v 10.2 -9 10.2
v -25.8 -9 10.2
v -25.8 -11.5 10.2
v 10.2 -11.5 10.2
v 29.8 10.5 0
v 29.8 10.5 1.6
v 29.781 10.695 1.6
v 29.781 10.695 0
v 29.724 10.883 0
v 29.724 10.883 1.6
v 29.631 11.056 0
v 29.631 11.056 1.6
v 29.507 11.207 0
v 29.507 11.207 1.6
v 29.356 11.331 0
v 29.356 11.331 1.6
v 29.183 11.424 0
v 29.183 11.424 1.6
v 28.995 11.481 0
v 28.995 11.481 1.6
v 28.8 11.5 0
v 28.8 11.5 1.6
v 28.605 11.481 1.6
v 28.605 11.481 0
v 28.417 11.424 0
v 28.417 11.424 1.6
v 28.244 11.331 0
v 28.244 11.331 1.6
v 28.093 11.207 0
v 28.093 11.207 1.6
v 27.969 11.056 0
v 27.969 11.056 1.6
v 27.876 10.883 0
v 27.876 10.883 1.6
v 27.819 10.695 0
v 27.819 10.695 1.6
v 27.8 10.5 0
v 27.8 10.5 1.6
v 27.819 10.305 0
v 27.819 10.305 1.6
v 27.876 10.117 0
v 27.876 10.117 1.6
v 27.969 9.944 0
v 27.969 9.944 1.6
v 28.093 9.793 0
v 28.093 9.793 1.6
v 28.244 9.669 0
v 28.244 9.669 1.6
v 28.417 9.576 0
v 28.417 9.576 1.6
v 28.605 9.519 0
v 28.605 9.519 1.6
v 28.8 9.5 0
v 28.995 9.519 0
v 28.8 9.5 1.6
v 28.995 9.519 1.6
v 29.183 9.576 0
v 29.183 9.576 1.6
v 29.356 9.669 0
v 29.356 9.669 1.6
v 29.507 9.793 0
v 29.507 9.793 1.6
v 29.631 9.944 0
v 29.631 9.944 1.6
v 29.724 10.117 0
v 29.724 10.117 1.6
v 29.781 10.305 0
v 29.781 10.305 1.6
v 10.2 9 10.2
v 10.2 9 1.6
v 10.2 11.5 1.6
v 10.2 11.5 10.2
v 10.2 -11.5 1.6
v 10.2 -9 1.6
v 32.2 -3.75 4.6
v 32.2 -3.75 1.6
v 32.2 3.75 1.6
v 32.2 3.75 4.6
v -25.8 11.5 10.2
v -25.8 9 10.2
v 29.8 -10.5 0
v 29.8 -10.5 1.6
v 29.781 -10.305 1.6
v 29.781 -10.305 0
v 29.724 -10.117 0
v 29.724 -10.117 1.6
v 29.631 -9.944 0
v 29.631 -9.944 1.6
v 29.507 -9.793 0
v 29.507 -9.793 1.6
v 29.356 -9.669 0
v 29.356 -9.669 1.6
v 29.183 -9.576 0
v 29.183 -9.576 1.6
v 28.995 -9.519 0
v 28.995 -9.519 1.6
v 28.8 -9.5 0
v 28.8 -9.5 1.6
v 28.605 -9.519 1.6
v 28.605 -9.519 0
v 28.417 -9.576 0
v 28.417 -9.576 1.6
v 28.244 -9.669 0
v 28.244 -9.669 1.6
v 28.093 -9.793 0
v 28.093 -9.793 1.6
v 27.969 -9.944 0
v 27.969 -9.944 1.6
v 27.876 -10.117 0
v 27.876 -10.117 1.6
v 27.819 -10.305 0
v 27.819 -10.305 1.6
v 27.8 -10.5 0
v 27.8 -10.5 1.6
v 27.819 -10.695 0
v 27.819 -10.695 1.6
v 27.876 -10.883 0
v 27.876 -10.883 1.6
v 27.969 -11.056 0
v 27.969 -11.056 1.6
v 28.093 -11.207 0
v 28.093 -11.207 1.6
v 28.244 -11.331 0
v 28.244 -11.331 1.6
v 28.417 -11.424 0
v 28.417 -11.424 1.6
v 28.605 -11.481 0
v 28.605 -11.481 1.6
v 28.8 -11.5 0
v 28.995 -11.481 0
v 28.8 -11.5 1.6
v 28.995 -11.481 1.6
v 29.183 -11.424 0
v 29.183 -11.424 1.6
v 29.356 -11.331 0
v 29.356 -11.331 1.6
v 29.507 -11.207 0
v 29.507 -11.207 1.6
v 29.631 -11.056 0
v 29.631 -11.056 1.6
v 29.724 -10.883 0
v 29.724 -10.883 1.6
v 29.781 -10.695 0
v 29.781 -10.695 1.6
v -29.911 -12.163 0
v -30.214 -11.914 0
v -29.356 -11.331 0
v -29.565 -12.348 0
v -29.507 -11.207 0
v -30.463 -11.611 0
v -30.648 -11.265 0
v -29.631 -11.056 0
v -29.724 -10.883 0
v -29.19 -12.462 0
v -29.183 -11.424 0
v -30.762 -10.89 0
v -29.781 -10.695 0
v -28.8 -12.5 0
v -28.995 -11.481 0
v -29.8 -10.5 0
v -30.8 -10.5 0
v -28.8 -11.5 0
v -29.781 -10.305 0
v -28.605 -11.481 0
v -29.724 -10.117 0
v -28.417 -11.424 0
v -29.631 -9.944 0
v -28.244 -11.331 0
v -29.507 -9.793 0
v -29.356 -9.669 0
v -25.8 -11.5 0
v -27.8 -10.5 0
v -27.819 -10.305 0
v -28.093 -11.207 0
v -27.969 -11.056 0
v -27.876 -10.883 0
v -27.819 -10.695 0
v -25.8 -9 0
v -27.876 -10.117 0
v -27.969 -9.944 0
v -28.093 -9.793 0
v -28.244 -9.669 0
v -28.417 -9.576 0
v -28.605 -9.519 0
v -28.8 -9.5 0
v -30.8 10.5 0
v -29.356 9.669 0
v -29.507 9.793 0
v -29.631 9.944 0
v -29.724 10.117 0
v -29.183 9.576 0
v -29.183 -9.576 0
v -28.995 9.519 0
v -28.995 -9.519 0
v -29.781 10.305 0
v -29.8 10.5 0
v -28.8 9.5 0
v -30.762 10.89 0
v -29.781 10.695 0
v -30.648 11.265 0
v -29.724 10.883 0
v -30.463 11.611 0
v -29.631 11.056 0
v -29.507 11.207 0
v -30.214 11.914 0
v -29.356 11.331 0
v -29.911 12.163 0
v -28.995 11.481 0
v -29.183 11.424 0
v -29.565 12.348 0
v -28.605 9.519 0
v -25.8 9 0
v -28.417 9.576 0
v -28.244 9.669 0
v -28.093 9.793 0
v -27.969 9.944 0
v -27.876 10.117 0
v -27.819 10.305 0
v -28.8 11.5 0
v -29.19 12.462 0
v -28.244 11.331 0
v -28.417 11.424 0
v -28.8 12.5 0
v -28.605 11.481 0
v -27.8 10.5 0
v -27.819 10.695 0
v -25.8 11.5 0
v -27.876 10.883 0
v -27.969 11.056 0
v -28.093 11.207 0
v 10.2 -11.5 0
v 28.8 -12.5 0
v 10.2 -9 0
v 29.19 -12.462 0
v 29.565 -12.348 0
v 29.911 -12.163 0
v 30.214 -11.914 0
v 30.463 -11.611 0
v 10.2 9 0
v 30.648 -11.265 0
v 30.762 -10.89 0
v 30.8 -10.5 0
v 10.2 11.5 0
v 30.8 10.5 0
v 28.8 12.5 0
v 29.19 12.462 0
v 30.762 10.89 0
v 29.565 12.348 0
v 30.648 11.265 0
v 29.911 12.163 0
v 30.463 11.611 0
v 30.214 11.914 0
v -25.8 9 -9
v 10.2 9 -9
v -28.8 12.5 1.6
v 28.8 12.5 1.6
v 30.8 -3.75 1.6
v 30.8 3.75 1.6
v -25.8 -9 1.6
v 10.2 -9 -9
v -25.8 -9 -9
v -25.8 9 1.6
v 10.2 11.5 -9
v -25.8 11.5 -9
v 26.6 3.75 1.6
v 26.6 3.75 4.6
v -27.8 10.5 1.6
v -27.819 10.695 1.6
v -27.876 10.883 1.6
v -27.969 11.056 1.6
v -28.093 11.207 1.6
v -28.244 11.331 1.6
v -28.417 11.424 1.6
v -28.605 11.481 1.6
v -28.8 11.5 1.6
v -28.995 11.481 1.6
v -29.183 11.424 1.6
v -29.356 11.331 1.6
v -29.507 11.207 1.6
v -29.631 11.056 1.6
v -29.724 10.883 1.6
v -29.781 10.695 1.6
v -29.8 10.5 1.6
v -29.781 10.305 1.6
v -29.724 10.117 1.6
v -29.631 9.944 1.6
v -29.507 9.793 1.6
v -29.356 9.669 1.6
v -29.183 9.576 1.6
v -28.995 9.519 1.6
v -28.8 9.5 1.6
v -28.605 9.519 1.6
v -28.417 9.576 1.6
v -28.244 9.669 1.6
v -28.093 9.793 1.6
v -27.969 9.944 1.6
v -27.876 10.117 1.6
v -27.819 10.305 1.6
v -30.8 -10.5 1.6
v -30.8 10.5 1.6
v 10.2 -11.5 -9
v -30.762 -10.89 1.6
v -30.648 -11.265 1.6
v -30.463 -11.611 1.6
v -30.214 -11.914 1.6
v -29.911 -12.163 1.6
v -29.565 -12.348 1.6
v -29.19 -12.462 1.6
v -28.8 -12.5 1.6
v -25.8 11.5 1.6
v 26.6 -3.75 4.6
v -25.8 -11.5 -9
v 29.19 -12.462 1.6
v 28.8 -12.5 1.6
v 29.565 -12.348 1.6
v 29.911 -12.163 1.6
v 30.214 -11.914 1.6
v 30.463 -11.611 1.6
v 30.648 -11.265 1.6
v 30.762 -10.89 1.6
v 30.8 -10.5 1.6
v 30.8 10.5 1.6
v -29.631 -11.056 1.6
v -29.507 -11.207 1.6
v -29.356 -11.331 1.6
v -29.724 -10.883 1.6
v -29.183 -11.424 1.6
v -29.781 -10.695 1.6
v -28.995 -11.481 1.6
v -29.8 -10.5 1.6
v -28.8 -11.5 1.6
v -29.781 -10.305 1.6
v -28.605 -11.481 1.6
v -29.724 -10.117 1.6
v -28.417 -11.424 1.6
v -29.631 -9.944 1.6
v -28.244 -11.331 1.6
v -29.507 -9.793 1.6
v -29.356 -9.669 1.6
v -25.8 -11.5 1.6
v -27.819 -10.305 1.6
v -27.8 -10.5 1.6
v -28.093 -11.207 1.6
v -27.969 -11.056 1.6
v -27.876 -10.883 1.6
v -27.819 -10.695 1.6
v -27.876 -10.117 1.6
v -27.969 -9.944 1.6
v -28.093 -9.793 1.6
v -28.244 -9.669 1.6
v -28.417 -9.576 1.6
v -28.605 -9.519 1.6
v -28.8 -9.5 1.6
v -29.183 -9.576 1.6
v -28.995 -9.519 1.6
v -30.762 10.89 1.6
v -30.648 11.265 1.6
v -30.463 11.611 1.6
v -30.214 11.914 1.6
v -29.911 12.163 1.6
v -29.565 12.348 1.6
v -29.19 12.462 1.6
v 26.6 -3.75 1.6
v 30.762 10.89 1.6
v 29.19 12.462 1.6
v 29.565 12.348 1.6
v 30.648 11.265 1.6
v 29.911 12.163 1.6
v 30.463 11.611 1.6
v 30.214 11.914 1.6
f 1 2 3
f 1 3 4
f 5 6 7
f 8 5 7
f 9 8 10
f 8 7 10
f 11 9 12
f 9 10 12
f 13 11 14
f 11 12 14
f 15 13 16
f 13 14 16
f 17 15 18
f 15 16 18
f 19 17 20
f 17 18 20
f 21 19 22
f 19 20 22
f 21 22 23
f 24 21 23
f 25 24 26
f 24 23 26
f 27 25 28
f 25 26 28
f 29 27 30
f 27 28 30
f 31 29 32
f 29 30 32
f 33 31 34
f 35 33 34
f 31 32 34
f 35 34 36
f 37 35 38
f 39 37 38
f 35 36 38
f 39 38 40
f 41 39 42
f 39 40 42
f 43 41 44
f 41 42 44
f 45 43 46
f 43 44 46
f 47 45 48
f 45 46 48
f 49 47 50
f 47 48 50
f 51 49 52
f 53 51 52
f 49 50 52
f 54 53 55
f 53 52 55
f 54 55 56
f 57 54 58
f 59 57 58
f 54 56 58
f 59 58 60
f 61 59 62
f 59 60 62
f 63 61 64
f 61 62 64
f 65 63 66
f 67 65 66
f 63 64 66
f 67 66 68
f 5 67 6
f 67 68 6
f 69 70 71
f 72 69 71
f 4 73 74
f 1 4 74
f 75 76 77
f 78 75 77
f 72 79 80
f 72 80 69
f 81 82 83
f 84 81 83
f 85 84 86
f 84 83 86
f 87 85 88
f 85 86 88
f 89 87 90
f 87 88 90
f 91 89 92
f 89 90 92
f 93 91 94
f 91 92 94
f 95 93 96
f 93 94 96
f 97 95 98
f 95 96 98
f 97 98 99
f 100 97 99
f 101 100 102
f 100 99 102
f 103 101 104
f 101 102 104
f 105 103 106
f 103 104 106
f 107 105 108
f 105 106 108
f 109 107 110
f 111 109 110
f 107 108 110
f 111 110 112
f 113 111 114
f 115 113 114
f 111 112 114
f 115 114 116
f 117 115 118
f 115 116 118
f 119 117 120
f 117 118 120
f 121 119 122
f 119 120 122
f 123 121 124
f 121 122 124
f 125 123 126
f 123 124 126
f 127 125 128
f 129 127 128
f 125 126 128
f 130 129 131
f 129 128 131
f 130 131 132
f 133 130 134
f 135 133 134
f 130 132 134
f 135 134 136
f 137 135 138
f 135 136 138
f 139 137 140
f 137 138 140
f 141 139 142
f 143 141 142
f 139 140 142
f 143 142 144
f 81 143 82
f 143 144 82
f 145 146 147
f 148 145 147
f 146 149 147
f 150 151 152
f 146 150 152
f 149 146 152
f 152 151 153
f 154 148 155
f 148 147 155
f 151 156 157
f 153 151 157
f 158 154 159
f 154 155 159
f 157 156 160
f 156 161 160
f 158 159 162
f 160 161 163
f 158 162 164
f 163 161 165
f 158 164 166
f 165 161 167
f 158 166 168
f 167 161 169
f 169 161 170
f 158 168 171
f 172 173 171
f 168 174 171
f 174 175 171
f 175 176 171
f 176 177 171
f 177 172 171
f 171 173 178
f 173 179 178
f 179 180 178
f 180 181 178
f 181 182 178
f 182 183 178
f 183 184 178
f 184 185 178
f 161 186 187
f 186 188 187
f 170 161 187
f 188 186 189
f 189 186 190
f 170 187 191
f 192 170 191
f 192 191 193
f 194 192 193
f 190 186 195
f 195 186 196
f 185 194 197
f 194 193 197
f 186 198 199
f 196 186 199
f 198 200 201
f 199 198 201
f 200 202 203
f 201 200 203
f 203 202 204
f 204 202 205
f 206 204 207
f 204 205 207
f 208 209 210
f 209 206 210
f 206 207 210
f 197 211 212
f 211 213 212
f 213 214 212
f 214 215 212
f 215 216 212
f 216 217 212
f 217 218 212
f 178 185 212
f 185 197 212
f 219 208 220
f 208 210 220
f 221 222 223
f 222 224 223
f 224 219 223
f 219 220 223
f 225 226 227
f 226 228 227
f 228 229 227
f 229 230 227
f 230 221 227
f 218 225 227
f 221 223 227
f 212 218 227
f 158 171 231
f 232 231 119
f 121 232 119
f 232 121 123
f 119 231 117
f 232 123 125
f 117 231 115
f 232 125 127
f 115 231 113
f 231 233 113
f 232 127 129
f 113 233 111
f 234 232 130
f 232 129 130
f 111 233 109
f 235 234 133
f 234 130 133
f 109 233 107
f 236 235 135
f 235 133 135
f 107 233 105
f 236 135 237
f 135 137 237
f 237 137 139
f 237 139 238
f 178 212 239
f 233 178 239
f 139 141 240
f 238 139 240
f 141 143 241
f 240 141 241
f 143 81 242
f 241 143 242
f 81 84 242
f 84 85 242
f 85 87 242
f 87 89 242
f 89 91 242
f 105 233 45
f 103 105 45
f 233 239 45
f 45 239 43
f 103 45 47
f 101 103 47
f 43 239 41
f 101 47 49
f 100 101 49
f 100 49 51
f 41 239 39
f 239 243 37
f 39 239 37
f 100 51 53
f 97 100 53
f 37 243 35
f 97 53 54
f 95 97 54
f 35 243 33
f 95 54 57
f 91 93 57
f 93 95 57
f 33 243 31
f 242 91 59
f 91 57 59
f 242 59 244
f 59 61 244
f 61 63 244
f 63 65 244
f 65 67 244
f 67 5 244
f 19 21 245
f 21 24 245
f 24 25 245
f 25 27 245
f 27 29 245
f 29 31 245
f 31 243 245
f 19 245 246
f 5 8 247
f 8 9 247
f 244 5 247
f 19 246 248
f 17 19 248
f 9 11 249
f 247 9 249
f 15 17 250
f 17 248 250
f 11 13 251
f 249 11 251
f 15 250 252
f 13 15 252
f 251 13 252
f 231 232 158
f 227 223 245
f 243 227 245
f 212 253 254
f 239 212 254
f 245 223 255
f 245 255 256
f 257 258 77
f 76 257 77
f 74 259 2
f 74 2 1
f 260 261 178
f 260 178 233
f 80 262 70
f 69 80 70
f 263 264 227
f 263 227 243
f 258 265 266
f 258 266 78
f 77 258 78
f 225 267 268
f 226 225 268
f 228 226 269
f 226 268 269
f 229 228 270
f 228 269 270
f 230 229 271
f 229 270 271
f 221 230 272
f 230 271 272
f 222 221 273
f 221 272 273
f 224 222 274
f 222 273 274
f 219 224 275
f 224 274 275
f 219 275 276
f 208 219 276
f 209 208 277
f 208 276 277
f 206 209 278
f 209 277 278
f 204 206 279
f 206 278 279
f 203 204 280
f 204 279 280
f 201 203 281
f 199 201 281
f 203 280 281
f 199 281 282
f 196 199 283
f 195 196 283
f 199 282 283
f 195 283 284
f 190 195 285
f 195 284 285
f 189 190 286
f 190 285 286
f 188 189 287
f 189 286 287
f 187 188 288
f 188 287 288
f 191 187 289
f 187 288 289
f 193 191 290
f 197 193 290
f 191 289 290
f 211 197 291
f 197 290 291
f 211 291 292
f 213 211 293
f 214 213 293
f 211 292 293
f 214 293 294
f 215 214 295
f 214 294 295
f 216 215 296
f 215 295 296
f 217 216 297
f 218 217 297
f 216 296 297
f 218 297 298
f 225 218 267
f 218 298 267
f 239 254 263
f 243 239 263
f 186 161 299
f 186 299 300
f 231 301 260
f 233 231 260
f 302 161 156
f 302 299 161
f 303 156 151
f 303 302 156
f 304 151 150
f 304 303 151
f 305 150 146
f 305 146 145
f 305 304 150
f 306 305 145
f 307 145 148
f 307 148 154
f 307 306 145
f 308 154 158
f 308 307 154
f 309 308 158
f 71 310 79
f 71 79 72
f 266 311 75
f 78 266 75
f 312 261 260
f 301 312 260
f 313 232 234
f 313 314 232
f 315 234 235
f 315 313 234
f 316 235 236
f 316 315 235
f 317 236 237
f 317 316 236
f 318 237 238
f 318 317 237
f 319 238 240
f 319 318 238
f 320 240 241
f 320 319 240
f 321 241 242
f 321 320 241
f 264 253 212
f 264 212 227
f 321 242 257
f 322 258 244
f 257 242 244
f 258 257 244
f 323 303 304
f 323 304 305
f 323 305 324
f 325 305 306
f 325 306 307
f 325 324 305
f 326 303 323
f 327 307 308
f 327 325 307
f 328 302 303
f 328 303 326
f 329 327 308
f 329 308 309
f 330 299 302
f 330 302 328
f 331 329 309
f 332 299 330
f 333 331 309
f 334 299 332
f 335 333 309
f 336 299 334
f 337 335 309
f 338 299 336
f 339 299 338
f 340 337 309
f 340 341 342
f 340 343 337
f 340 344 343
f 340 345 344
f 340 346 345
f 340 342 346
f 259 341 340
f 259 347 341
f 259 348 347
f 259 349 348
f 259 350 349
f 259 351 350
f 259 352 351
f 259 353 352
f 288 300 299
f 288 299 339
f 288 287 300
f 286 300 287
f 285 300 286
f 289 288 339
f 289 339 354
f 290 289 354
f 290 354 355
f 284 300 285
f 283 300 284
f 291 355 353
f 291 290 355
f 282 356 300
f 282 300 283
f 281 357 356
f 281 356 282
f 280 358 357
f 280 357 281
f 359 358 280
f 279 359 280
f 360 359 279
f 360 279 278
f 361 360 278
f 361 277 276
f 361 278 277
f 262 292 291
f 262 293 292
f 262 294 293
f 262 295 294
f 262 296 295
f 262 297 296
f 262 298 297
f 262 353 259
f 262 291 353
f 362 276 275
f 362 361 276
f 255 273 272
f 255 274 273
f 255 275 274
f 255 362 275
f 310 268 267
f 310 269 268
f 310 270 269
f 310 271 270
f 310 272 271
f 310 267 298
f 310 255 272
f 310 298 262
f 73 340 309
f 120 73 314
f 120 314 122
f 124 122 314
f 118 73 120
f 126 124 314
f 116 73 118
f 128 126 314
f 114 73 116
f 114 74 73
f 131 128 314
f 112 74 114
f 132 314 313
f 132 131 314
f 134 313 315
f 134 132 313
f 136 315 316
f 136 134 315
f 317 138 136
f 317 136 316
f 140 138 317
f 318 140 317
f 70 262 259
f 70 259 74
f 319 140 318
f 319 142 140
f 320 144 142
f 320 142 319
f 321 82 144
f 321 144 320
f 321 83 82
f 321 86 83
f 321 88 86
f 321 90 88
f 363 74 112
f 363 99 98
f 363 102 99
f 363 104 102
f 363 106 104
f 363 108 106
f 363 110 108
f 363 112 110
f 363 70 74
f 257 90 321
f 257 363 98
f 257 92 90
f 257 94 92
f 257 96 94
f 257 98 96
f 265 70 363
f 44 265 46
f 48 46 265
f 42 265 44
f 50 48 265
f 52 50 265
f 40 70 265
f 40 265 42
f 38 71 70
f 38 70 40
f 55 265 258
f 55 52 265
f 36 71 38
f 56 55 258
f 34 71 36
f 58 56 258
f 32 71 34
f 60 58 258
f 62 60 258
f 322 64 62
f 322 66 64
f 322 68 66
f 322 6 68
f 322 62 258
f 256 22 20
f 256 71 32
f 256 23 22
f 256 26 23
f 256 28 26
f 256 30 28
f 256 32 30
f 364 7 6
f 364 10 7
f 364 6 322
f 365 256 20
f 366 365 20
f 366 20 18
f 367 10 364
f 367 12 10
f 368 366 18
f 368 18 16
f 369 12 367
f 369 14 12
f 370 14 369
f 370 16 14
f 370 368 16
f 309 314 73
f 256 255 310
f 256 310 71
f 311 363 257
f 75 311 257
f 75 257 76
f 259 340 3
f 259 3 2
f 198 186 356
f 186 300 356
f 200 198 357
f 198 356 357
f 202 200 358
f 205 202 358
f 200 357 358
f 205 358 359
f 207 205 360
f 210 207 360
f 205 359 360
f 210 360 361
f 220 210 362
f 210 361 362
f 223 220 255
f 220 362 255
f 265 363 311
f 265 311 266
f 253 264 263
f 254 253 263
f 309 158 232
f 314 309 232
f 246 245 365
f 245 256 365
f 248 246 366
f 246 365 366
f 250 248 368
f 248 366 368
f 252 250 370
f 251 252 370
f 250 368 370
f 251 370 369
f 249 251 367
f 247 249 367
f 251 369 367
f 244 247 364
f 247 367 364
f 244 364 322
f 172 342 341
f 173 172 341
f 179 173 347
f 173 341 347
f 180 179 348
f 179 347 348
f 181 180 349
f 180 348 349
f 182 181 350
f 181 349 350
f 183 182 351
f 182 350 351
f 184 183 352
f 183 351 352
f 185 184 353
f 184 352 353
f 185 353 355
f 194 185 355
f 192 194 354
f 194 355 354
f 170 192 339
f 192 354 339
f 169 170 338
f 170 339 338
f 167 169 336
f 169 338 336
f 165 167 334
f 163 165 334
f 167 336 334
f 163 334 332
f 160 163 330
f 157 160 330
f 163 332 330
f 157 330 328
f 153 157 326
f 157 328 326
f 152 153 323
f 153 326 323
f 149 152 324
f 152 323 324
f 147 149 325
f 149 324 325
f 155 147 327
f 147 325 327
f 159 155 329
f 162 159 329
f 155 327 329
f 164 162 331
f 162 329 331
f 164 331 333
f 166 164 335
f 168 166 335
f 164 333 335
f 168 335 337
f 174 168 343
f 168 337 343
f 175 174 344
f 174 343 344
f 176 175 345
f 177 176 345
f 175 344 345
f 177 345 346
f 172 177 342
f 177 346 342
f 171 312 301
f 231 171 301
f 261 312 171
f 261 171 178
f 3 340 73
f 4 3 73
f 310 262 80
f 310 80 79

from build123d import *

# Parameters (mm, degrees)
SCHIZZO1_W                        = 61.6
SCHIZZO1_H                        = 25
ESTRUSIONE_ESTRUSIONE1_DEPTH      = 1.6
SCHIZZO2_R                        = 1
TAGLIO_ESTRUSIONE1_DEPTH          = 1.6
RACCORDO1_R                       = 2
SCHIZZO3_W                        = 5.6
SCHIZZO3_H                        = 7.5
ESTRUSIONE_ESTRUSIONE2_DEPTH      = 3
ESTRUSIONE_ESTRUSIONE3_DEPTH      = 8.6
ESTRUSIONE_ESTRUSIONE3_DEPTH_BACK = 10.6
SCHIZZO4_W                        = 36
SCHIZZO4_H                        = 2.5


with BuildPart() as part:
    # Schizzo1 → Estrusione-Estrusione1 (new body)
    with BuildSketch(Plane.XY):
        Rectangle(SCHIZZO1_W, SCHIZZO1_H)
    extrude(amount=ESTRUSIONE_ESTRUSIONE1_DEPTH)

    # Schizzo2 → Taglio-Estrusione1 (cut)
    with BuildSketch(Plane.XY.offset(1.6)):
        with Locations((-28.8, 10.5)):
            Circle(SCHIZZO2_R)
        with Locations((28.8, 10.5)):
            Circle(SCHIZZO2_R)
        with Locations((28.8, -10.5)):
            Circle(SCHIZZO2_R)
        with Locations((-28.8, -10.5)):
            Circle(SCHIZZO2_R)
    extrude(amount=-TAGLIO_ESTRUSIONE1_DEPTH, mode=Mode.SUBTRACT)

    # Raccordo1
    raccordo1_edges = [part.edges().sort_by_distance(p)[0] for p in [
        (-30.8, 12.5, 0.8),
        (30.8, 12.5, 0.8),
        (30.8, -12.5, 0.8),
        (-30.8, -12.5, 0.8),
    ]]
    fillet(raccordo1_edges, radius=RACCORDO1_R)

    # Schizzo3 → Estrusione-Estrusione2 (add)
    with BuildSketch(Plane.XY.offset(1.6)):
        with Locations((29.4, 0)):
            Rectangle(SCHIZZO3_W, SCHIZZO3_H)
    extrude(amount=ESTRUSIONE_ESTRUSIONE2_DEPTH)

    # Schizzo4 → Estrusione-Estrusione3 (add, two sides: drawn at the far end of the back side and taken through both)
    with BuildSketch(Plane.XY.offset(1.6).offset(-ESTRUSIONE_ESTRUSIONE3_DEPTH_BACK)):
        with Locations((-7.8, 10.25)):
            Rectangle(SCHIZZO4_W, SCHIZZO4_H)
        with Locations((-7.8, -10.25)):
            Rectangle(SCHIZZO4_W, SCHIZZO4_H)
    extrude(amount=ESTRUSIONE_ESTRUSIONE3_DEPTH + ESTRUSIONE_ESTRUSIONE3_DEPTH_BACK)


solid = part.part
